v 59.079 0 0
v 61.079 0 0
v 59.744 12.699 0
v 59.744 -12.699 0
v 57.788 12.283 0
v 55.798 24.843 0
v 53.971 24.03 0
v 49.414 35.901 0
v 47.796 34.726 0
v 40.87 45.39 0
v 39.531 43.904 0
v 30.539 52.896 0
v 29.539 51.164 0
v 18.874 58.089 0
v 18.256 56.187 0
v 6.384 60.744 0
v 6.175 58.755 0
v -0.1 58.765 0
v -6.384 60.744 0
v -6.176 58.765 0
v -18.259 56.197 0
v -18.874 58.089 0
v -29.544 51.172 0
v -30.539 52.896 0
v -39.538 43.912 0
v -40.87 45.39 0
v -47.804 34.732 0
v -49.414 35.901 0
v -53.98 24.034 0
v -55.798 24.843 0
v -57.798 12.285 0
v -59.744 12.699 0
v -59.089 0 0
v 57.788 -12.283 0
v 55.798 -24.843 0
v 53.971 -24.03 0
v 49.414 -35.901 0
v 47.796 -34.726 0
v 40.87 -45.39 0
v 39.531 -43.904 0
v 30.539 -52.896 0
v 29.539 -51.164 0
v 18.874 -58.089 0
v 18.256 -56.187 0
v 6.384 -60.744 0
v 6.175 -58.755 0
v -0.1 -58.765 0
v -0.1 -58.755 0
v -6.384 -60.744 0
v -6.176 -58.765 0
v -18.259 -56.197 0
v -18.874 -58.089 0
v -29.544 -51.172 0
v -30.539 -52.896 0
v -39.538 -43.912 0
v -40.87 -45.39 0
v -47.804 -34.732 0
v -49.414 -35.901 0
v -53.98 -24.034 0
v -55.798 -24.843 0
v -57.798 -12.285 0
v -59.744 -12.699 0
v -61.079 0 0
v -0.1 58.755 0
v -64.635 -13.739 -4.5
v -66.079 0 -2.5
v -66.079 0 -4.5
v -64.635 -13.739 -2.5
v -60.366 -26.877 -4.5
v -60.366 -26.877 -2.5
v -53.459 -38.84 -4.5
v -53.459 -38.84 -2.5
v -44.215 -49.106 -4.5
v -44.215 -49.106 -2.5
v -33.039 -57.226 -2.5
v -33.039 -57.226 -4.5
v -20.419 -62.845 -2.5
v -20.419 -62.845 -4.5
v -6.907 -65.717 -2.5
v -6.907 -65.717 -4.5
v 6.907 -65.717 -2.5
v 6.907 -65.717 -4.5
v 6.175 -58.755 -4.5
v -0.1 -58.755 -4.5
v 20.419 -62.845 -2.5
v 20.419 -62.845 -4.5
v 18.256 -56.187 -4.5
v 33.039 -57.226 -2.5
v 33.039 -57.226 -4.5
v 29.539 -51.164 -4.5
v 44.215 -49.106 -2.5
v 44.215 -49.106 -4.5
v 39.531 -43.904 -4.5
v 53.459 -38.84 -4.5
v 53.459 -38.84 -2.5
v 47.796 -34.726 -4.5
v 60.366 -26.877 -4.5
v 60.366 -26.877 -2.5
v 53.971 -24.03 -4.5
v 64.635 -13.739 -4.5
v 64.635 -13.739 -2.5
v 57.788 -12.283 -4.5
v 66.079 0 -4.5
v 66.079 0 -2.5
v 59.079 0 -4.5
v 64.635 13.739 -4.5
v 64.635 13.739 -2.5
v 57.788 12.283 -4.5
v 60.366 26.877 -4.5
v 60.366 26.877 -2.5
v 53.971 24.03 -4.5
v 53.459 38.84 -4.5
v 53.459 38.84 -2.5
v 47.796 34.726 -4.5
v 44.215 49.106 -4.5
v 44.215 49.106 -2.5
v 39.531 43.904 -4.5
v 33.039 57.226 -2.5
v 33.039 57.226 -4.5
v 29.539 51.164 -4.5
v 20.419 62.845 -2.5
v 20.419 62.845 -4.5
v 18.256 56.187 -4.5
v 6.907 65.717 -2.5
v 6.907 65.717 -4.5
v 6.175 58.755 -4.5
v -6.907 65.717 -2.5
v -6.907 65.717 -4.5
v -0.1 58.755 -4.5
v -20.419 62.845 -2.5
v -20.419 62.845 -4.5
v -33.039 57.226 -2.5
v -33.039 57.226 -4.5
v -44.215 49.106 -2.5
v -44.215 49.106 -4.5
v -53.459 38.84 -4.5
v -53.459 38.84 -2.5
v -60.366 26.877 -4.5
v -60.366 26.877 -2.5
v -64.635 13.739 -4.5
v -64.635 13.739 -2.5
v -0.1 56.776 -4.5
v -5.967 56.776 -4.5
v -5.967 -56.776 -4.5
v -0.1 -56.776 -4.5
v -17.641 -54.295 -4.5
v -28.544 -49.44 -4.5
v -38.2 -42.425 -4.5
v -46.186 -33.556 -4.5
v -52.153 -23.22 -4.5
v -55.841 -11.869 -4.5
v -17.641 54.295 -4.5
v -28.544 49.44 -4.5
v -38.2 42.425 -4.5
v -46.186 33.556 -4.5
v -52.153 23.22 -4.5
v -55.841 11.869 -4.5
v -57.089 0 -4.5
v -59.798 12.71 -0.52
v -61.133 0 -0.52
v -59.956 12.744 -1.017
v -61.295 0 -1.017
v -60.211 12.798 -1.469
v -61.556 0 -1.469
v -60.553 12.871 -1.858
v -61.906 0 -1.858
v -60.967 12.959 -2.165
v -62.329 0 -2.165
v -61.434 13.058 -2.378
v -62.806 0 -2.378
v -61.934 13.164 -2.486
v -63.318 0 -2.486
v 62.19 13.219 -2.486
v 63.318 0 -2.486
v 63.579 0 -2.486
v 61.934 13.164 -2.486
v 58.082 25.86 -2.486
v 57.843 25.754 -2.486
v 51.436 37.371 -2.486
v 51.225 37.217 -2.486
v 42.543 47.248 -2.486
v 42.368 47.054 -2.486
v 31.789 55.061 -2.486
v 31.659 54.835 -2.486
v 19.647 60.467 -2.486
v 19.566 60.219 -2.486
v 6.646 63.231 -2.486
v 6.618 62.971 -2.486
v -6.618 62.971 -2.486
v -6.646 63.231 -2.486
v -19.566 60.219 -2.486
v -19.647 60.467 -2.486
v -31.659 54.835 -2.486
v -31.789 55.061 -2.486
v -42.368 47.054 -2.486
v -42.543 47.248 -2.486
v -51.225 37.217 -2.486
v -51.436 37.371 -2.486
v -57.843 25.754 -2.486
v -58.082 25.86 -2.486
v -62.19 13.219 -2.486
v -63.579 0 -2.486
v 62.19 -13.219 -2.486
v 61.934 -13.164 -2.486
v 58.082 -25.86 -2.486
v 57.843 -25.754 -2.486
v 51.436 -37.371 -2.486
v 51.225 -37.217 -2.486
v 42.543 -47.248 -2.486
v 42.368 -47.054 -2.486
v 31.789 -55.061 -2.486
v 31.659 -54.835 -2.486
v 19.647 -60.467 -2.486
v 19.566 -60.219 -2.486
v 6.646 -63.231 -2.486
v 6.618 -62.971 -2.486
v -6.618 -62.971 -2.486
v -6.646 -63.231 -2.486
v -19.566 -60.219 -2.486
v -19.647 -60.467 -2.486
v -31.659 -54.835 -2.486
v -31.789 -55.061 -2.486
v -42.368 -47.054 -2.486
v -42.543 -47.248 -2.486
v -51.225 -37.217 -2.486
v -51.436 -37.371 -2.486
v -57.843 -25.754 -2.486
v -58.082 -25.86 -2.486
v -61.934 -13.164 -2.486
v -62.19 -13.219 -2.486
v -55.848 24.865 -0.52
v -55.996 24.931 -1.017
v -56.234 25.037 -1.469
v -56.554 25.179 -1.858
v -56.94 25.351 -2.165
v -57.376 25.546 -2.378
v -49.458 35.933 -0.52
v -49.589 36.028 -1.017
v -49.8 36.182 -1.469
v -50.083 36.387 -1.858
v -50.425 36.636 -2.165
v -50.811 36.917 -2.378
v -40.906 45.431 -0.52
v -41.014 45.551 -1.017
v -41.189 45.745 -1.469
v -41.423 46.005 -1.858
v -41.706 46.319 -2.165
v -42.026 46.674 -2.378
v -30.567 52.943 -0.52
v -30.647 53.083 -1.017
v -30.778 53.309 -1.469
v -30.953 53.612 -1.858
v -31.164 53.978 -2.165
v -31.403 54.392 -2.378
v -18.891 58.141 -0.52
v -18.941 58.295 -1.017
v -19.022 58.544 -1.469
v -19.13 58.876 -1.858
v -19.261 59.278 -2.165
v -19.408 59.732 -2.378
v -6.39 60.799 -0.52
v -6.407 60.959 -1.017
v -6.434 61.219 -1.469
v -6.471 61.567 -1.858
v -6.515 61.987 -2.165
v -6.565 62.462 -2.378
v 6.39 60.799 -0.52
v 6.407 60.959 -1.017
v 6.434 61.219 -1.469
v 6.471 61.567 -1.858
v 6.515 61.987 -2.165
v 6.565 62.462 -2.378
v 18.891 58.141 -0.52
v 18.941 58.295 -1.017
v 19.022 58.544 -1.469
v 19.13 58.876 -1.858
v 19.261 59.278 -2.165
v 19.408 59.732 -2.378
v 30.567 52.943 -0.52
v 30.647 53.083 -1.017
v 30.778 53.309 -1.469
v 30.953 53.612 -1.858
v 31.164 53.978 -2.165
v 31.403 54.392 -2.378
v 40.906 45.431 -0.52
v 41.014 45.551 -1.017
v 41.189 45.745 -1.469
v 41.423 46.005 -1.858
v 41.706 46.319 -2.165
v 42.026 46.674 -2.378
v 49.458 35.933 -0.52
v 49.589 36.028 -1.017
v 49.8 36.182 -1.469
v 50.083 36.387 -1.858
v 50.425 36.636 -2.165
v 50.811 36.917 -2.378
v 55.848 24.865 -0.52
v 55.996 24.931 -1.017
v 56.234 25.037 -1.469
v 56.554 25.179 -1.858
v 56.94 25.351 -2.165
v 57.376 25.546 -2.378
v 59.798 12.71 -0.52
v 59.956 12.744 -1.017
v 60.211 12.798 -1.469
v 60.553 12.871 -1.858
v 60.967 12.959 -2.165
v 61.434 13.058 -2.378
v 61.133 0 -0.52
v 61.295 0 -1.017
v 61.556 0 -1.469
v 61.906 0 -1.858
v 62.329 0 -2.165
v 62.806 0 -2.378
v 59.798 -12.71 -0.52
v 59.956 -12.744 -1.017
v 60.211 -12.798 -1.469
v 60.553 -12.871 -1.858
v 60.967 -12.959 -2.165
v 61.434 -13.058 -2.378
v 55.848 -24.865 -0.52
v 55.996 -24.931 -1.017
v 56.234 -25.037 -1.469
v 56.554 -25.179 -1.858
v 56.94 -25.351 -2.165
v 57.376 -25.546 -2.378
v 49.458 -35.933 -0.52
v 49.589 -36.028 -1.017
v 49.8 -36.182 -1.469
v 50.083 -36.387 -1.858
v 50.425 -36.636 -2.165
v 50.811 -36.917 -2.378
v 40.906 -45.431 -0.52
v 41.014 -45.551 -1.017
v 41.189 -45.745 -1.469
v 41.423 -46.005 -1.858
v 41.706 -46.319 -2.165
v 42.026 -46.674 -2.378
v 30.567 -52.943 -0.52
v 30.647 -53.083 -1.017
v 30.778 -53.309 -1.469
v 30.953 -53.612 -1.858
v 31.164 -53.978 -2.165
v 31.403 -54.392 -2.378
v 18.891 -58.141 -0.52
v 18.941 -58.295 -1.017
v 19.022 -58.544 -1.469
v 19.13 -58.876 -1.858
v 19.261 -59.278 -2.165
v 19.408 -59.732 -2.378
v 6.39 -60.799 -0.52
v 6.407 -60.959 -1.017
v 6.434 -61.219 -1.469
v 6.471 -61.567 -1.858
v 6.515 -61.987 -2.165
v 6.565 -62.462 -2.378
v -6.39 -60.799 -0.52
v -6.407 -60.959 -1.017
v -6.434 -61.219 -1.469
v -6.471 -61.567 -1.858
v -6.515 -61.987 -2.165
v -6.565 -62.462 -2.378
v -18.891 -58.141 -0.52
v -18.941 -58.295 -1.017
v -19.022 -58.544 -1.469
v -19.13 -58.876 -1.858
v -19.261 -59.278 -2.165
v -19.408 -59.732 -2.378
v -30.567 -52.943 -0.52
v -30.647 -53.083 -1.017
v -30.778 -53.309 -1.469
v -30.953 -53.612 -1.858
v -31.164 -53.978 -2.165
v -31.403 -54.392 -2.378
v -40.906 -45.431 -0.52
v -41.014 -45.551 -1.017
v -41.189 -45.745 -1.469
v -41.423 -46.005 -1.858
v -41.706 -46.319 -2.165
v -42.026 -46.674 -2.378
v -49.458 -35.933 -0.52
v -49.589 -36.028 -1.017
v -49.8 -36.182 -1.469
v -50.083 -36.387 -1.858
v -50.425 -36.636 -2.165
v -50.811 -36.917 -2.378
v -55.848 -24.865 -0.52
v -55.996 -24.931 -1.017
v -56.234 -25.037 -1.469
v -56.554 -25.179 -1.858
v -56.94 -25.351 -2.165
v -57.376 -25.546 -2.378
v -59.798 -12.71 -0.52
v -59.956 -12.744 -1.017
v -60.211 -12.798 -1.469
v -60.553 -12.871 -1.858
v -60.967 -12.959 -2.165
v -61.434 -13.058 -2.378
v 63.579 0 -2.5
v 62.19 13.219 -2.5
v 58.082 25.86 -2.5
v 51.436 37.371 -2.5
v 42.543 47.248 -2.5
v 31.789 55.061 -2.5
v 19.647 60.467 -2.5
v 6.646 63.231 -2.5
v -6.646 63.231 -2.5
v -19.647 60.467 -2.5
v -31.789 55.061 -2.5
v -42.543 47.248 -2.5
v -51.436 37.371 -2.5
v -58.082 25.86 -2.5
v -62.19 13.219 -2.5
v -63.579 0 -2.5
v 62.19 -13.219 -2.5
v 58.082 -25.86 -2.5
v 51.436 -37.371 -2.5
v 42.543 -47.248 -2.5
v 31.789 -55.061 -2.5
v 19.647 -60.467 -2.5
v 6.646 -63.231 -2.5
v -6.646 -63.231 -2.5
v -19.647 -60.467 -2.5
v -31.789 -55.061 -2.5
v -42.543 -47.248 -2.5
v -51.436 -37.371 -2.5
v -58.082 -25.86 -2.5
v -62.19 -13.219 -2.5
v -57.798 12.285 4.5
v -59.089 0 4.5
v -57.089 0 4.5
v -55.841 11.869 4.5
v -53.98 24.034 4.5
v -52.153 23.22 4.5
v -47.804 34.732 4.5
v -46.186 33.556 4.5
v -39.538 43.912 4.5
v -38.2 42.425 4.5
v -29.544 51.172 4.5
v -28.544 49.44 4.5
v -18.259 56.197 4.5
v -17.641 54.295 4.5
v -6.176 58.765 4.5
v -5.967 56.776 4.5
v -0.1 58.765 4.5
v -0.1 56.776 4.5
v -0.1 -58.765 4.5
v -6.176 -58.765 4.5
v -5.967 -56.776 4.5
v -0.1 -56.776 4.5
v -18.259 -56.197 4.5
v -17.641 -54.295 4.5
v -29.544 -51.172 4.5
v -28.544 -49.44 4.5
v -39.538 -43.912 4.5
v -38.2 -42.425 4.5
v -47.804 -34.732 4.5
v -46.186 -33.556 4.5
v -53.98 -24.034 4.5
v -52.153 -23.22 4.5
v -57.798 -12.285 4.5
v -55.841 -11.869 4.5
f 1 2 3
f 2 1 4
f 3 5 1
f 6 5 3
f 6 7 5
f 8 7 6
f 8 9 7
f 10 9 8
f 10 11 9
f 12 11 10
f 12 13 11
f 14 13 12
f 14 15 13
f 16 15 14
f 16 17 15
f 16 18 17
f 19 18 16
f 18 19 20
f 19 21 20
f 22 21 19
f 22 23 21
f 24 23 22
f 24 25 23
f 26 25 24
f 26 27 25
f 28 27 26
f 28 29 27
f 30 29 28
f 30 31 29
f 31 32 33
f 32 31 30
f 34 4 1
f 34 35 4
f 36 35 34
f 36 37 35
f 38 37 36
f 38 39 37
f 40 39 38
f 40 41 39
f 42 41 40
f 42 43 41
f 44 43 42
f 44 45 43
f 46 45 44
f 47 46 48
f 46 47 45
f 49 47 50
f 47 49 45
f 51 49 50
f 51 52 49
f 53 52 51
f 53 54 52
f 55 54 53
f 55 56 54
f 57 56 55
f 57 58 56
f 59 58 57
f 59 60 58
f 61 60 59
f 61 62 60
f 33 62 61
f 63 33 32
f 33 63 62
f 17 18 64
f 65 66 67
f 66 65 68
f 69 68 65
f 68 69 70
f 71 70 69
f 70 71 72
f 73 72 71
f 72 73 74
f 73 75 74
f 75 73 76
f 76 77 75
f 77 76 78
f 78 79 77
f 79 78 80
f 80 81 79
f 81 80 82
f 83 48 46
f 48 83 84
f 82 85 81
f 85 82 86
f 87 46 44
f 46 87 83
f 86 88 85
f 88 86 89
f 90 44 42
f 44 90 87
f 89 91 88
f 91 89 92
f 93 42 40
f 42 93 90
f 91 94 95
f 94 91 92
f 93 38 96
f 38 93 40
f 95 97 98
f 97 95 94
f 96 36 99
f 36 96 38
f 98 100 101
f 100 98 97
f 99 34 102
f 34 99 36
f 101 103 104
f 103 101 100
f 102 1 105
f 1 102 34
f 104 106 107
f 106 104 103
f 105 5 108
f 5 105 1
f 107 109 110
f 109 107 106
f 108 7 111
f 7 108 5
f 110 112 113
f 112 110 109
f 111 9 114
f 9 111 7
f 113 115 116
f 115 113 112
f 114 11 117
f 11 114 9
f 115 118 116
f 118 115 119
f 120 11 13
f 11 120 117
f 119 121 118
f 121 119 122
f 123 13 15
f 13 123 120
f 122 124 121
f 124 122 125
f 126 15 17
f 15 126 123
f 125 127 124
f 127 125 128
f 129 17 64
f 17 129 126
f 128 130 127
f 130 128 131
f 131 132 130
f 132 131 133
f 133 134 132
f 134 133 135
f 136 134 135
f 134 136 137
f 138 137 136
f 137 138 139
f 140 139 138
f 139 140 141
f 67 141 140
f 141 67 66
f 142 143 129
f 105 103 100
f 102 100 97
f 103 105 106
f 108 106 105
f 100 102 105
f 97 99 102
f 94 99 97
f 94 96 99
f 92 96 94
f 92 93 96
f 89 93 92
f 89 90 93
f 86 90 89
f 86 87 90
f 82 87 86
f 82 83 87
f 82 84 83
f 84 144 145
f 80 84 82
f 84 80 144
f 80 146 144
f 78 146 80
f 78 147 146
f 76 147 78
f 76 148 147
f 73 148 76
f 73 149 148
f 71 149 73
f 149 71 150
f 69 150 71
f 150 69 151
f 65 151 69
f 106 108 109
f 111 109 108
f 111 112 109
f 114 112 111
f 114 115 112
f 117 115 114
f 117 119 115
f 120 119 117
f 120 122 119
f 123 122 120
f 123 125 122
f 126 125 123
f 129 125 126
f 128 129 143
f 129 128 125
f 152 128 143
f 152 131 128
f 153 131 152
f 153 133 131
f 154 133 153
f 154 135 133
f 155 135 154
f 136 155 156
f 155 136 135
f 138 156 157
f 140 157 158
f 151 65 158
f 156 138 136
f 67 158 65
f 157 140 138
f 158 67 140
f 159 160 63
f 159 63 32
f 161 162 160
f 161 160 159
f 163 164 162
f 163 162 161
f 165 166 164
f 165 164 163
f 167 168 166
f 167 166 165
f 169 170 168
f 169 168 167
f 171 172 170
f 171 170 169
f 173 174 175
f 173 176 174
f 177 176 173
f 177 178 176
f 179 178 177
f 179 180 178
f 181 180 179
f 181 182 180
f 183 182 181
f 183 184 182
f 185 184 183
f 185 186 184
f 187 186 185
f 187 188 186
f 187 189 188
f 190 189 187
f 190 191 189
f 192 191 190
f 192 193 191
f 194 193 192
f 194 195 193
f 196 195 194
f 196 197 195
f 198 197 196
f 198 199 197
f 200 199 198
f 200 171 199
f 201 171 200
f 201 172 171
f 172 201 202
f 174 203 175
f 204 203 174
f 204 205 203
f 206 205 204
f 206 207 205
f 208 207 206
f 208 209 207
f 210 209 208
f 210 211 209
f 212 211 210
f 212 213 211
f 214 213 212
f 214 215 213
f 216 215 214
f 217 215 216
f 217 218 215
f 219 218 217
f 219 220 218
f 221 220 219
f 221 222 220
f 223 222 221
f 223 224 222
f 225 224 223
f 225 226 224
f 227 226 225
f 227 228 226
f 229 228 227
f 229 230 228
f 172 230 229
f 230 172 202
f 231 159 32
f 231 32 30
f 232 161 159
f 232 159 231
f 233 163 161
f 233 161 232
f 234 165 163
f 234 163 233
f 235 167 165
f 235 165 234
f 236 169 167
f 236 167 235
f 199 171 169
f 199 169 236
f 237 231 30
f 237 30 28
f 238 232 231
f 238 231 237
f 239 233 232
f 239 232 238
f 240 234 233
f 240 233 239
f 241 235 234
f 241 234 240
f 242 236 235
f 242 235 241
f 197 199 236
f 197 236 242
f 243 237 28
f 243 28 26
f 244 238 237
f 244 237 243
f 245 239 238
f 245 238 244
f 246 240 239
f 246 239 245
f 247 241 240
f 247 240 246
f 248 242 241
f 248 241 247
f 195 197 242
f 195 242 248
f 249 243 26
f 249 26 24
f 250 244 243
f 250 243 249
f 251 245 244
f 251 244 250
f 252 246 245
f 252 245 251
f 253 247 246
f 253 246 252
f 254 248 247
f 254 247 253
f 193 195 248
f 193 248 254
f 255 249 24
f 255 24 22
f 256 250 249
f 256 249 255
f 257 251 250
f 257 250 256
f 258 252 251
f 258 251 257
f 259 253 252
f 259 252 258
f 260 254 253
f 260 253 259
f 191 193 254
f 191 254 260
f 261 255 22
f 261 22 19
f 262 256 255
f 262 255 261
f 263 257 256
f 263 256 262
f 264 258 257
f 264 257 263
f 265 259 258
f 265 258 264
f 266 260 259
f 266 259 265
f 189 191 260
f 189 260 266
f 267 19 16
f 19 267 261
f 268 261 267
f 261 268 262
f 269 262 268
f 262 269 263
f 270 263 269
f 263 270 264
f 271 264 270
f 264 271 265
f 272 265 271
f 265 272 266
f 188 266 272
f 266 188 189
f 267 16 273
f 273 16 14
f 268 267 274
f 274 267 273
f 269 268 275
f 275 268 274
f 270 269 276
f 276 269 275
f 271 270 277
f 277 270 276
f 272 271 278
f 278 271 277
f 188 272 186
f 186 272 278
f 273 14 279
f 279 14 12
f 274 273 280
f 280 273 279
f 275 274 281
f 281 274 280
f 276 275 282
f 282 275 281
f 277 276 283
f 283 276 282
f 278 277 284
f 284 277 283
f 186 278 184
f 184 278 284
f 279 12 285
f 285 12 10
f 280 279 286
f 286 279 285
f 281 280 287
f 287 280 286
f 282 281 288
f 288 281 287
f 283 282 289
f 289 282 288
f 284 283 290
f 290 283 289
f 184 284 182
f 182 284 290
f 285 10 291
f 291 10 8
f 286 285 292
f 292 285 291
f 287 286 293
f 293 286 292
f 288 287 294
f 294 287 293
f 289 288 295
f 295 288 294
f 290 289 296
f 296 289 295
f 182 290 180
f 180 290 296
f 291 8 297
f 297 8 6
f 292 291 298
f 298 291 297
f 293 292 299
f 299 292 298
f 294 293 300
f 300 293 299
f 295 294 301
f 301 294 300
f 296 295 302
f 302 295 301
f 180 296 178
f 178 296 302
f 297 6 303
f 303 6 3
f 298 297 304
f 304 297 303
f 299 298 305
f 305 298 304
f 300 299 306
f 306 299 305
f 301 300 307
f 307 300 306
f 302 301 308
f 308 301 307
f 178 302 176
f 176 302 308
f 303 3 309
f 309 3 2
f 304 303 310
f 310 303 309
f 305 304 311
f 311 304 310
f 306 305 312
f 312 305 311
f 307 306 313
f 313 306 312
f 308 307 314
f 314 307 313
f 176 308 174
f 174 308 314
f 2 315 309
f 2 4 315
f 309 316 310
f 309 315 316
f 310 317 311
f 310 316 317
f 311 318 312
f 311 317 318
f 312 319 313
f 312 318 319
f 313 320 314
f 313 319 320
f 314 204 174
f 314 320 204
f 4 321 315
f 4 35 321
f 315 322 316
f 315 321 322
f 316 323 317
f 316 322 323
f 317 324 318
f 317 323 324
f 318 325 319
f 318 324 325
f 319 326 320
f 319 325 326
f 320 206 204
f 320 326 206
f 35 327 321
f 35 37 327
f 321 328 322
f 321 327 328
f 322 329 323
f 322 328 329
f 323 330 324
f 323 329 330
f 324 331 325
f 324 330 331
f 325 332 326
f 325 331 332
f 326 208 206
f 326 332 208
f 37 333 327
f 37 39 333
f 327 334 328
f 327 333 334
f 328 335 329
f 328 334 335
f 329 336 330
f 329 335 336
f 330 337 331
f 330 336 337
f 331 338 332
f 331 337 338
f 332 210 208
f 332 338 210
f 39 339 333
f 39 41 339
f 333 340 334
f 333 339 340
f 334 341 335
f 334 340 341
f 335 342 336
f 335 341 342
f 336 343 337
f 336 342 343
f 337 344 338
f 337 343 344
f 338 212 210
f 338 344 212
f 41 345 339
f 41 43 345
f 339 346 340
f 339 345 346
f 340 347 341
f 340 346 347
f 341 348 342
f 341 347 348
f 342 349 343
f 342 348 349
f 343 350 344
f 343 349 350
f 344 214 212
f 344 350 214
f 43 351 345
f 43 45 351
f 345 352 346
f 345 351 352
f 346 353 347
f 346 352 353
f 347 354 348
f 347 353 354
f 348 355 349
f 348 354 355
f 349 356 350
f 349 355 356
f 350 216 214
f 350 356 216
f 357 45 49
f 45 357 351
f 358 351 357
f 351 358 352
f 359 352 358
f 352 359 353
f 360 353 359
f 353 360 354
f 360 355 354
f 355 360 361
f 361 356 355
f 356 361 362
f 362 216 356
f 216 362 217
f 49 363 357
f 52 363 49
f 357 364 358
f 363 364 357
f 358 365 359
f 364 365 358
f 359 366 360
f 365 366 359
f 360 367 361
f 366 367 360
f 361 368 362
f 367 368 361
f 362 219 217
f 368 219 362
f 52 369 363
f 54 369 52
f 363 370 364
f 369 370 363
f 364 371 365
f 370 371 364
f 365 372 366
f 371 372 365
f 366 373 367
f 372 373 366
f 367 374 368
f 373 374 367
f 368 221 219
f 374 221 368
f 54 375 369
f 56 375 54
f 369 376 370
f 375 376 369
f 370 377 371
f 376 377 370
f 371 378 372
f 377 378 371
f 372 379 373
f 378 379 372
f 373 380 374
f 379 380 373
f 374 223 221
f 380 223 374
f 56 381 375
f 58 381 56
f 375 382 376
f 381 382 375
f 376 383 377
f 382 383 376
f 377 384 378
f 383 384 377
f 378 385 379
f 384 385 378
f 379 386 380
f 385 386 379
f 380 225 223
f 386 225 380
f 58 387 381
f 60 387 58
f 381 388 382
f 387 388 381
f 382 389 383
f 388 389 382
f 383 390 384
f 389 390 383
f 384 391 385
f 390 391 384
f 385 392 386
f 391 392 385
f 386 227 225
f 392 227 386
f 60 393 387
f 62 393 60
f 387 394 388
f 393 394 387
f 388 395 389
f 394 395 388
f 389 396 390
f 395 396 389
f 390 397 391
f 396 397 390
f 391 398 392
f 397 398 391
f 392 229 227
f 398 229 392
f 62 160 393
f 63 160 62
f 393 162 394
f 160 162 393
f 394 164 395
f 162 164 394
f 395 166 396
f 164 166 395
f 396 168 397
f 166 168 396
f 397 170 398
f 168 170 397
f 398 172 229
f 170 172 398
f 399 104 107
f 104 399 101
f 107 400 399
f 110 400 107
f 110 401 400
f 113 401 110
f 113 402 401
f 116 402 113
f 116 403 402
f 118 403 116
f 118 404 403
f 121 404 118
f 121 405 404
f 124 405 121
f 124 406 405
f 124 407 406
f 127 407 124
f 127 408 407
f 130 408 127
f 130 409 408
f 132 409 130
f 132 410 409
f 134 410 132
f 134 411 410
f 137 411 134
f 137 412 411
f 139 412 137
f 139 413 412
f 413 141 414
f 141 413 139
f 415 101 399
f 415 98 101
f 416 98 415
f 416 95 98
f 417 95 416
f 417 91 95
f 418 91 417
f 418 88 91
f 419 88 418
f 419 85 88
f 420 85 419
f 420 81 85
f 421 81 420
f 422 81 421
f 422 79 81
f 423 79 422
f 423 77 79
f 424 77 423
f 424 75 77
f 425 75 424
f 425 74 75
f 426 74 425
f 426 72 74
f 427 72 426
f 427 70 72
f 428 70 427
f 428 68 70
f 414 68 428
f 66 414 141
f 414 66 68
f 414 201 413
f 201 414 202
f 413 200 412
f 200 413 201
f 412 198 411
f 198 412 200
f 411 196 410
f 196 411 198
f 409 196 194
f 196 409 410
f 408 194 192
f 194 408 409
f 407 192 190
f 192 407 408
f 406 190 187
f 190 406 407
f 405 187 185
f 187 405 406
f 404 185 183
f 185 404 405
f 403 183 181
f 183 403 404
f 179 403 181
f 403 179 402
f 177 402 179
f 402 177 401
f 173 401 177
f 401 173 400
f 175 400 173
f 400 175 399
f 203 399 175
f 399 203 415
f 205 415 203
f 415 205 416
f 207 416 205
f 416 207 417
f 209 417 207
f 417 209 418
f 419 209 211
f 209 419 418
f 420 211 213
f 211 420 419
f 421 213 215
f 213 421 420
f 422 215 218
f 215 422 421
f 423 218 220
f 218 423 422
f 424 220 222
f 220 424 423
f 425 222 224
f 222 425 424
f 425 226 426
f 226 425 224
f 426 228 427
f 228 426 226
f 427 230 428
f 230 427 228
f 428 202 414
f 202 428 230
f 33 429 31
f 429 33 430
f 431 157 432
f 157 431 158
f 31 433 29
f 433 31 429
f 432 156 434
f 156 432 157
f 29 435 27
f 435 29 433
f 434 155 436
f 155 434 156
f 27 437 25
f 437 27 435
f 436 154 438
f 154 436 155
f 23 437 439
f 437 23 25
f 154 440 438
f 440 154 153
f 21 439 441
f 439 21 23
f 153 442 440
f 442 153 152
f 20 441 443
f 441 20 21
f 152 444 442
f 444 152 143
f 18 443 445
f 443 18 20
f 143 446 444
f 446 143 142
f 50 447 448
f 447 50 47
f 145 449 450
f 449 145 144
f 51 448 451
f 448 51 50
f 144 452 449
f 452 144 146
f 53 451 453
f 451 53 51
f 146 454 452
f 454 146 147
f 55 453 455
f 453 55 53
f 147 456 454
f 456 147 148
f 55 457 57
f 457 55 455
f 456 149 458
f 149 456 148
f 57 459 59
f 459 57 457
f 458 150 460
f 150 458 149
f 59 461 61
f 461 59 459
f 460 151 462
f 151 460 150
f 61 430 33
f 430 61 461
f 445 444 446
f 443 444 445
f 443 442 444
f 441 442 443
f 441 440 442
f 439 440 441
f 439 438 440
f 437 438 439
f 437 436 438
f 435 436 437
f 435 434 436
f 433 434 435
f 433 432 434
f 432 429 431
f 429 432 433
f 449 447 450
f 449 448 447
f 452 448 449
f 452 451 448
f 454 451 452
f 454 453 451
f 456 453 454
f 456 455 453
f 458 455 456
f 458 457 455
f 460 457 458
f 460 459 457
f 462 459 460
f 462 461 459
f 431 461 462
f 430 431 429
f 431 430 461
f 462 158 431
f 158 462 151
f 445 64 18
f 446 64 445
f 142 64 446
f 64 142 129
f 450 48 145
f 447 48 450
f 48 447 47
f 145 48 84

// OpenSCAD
$fs=0.1;
belt_length=200; // in mm
belt_thickness=5; // Distance from outside surface to inside, it's diameter in mm.
belt_width=5;



interface_surface=2; //Amount of flat area behind the belt.
difference(){
rotate([180,0,0]) rotate_extrude() translate([(belt_length/3.1457)-(belt_thickness/2)-interface_surface,0,0]) square([belt_width+interface_surface,belt_thickness/2+2]);
 
#rotate_extrude() translate([belt_length/3.1457,0,0]) circle(belt_width/2);
rotate_extrude() translate([belt_length/3.1457,-belt_width/2,0]) square([belt_width/2+0.01,belt_width]);
}

//The tab that aligns the two parts.

difference(){
rotate_extrude() translate([((belt_length/3.1457)-(belt_thickness/2)-interface_surface*2+0.01),-(belt_thickness/2+2),0]) square([interface_surface,belt_thickness+4]);

translate ([-0.1,-belt_length/3,-interface_surface-belt_thickness]) cube(belt_length);

}
